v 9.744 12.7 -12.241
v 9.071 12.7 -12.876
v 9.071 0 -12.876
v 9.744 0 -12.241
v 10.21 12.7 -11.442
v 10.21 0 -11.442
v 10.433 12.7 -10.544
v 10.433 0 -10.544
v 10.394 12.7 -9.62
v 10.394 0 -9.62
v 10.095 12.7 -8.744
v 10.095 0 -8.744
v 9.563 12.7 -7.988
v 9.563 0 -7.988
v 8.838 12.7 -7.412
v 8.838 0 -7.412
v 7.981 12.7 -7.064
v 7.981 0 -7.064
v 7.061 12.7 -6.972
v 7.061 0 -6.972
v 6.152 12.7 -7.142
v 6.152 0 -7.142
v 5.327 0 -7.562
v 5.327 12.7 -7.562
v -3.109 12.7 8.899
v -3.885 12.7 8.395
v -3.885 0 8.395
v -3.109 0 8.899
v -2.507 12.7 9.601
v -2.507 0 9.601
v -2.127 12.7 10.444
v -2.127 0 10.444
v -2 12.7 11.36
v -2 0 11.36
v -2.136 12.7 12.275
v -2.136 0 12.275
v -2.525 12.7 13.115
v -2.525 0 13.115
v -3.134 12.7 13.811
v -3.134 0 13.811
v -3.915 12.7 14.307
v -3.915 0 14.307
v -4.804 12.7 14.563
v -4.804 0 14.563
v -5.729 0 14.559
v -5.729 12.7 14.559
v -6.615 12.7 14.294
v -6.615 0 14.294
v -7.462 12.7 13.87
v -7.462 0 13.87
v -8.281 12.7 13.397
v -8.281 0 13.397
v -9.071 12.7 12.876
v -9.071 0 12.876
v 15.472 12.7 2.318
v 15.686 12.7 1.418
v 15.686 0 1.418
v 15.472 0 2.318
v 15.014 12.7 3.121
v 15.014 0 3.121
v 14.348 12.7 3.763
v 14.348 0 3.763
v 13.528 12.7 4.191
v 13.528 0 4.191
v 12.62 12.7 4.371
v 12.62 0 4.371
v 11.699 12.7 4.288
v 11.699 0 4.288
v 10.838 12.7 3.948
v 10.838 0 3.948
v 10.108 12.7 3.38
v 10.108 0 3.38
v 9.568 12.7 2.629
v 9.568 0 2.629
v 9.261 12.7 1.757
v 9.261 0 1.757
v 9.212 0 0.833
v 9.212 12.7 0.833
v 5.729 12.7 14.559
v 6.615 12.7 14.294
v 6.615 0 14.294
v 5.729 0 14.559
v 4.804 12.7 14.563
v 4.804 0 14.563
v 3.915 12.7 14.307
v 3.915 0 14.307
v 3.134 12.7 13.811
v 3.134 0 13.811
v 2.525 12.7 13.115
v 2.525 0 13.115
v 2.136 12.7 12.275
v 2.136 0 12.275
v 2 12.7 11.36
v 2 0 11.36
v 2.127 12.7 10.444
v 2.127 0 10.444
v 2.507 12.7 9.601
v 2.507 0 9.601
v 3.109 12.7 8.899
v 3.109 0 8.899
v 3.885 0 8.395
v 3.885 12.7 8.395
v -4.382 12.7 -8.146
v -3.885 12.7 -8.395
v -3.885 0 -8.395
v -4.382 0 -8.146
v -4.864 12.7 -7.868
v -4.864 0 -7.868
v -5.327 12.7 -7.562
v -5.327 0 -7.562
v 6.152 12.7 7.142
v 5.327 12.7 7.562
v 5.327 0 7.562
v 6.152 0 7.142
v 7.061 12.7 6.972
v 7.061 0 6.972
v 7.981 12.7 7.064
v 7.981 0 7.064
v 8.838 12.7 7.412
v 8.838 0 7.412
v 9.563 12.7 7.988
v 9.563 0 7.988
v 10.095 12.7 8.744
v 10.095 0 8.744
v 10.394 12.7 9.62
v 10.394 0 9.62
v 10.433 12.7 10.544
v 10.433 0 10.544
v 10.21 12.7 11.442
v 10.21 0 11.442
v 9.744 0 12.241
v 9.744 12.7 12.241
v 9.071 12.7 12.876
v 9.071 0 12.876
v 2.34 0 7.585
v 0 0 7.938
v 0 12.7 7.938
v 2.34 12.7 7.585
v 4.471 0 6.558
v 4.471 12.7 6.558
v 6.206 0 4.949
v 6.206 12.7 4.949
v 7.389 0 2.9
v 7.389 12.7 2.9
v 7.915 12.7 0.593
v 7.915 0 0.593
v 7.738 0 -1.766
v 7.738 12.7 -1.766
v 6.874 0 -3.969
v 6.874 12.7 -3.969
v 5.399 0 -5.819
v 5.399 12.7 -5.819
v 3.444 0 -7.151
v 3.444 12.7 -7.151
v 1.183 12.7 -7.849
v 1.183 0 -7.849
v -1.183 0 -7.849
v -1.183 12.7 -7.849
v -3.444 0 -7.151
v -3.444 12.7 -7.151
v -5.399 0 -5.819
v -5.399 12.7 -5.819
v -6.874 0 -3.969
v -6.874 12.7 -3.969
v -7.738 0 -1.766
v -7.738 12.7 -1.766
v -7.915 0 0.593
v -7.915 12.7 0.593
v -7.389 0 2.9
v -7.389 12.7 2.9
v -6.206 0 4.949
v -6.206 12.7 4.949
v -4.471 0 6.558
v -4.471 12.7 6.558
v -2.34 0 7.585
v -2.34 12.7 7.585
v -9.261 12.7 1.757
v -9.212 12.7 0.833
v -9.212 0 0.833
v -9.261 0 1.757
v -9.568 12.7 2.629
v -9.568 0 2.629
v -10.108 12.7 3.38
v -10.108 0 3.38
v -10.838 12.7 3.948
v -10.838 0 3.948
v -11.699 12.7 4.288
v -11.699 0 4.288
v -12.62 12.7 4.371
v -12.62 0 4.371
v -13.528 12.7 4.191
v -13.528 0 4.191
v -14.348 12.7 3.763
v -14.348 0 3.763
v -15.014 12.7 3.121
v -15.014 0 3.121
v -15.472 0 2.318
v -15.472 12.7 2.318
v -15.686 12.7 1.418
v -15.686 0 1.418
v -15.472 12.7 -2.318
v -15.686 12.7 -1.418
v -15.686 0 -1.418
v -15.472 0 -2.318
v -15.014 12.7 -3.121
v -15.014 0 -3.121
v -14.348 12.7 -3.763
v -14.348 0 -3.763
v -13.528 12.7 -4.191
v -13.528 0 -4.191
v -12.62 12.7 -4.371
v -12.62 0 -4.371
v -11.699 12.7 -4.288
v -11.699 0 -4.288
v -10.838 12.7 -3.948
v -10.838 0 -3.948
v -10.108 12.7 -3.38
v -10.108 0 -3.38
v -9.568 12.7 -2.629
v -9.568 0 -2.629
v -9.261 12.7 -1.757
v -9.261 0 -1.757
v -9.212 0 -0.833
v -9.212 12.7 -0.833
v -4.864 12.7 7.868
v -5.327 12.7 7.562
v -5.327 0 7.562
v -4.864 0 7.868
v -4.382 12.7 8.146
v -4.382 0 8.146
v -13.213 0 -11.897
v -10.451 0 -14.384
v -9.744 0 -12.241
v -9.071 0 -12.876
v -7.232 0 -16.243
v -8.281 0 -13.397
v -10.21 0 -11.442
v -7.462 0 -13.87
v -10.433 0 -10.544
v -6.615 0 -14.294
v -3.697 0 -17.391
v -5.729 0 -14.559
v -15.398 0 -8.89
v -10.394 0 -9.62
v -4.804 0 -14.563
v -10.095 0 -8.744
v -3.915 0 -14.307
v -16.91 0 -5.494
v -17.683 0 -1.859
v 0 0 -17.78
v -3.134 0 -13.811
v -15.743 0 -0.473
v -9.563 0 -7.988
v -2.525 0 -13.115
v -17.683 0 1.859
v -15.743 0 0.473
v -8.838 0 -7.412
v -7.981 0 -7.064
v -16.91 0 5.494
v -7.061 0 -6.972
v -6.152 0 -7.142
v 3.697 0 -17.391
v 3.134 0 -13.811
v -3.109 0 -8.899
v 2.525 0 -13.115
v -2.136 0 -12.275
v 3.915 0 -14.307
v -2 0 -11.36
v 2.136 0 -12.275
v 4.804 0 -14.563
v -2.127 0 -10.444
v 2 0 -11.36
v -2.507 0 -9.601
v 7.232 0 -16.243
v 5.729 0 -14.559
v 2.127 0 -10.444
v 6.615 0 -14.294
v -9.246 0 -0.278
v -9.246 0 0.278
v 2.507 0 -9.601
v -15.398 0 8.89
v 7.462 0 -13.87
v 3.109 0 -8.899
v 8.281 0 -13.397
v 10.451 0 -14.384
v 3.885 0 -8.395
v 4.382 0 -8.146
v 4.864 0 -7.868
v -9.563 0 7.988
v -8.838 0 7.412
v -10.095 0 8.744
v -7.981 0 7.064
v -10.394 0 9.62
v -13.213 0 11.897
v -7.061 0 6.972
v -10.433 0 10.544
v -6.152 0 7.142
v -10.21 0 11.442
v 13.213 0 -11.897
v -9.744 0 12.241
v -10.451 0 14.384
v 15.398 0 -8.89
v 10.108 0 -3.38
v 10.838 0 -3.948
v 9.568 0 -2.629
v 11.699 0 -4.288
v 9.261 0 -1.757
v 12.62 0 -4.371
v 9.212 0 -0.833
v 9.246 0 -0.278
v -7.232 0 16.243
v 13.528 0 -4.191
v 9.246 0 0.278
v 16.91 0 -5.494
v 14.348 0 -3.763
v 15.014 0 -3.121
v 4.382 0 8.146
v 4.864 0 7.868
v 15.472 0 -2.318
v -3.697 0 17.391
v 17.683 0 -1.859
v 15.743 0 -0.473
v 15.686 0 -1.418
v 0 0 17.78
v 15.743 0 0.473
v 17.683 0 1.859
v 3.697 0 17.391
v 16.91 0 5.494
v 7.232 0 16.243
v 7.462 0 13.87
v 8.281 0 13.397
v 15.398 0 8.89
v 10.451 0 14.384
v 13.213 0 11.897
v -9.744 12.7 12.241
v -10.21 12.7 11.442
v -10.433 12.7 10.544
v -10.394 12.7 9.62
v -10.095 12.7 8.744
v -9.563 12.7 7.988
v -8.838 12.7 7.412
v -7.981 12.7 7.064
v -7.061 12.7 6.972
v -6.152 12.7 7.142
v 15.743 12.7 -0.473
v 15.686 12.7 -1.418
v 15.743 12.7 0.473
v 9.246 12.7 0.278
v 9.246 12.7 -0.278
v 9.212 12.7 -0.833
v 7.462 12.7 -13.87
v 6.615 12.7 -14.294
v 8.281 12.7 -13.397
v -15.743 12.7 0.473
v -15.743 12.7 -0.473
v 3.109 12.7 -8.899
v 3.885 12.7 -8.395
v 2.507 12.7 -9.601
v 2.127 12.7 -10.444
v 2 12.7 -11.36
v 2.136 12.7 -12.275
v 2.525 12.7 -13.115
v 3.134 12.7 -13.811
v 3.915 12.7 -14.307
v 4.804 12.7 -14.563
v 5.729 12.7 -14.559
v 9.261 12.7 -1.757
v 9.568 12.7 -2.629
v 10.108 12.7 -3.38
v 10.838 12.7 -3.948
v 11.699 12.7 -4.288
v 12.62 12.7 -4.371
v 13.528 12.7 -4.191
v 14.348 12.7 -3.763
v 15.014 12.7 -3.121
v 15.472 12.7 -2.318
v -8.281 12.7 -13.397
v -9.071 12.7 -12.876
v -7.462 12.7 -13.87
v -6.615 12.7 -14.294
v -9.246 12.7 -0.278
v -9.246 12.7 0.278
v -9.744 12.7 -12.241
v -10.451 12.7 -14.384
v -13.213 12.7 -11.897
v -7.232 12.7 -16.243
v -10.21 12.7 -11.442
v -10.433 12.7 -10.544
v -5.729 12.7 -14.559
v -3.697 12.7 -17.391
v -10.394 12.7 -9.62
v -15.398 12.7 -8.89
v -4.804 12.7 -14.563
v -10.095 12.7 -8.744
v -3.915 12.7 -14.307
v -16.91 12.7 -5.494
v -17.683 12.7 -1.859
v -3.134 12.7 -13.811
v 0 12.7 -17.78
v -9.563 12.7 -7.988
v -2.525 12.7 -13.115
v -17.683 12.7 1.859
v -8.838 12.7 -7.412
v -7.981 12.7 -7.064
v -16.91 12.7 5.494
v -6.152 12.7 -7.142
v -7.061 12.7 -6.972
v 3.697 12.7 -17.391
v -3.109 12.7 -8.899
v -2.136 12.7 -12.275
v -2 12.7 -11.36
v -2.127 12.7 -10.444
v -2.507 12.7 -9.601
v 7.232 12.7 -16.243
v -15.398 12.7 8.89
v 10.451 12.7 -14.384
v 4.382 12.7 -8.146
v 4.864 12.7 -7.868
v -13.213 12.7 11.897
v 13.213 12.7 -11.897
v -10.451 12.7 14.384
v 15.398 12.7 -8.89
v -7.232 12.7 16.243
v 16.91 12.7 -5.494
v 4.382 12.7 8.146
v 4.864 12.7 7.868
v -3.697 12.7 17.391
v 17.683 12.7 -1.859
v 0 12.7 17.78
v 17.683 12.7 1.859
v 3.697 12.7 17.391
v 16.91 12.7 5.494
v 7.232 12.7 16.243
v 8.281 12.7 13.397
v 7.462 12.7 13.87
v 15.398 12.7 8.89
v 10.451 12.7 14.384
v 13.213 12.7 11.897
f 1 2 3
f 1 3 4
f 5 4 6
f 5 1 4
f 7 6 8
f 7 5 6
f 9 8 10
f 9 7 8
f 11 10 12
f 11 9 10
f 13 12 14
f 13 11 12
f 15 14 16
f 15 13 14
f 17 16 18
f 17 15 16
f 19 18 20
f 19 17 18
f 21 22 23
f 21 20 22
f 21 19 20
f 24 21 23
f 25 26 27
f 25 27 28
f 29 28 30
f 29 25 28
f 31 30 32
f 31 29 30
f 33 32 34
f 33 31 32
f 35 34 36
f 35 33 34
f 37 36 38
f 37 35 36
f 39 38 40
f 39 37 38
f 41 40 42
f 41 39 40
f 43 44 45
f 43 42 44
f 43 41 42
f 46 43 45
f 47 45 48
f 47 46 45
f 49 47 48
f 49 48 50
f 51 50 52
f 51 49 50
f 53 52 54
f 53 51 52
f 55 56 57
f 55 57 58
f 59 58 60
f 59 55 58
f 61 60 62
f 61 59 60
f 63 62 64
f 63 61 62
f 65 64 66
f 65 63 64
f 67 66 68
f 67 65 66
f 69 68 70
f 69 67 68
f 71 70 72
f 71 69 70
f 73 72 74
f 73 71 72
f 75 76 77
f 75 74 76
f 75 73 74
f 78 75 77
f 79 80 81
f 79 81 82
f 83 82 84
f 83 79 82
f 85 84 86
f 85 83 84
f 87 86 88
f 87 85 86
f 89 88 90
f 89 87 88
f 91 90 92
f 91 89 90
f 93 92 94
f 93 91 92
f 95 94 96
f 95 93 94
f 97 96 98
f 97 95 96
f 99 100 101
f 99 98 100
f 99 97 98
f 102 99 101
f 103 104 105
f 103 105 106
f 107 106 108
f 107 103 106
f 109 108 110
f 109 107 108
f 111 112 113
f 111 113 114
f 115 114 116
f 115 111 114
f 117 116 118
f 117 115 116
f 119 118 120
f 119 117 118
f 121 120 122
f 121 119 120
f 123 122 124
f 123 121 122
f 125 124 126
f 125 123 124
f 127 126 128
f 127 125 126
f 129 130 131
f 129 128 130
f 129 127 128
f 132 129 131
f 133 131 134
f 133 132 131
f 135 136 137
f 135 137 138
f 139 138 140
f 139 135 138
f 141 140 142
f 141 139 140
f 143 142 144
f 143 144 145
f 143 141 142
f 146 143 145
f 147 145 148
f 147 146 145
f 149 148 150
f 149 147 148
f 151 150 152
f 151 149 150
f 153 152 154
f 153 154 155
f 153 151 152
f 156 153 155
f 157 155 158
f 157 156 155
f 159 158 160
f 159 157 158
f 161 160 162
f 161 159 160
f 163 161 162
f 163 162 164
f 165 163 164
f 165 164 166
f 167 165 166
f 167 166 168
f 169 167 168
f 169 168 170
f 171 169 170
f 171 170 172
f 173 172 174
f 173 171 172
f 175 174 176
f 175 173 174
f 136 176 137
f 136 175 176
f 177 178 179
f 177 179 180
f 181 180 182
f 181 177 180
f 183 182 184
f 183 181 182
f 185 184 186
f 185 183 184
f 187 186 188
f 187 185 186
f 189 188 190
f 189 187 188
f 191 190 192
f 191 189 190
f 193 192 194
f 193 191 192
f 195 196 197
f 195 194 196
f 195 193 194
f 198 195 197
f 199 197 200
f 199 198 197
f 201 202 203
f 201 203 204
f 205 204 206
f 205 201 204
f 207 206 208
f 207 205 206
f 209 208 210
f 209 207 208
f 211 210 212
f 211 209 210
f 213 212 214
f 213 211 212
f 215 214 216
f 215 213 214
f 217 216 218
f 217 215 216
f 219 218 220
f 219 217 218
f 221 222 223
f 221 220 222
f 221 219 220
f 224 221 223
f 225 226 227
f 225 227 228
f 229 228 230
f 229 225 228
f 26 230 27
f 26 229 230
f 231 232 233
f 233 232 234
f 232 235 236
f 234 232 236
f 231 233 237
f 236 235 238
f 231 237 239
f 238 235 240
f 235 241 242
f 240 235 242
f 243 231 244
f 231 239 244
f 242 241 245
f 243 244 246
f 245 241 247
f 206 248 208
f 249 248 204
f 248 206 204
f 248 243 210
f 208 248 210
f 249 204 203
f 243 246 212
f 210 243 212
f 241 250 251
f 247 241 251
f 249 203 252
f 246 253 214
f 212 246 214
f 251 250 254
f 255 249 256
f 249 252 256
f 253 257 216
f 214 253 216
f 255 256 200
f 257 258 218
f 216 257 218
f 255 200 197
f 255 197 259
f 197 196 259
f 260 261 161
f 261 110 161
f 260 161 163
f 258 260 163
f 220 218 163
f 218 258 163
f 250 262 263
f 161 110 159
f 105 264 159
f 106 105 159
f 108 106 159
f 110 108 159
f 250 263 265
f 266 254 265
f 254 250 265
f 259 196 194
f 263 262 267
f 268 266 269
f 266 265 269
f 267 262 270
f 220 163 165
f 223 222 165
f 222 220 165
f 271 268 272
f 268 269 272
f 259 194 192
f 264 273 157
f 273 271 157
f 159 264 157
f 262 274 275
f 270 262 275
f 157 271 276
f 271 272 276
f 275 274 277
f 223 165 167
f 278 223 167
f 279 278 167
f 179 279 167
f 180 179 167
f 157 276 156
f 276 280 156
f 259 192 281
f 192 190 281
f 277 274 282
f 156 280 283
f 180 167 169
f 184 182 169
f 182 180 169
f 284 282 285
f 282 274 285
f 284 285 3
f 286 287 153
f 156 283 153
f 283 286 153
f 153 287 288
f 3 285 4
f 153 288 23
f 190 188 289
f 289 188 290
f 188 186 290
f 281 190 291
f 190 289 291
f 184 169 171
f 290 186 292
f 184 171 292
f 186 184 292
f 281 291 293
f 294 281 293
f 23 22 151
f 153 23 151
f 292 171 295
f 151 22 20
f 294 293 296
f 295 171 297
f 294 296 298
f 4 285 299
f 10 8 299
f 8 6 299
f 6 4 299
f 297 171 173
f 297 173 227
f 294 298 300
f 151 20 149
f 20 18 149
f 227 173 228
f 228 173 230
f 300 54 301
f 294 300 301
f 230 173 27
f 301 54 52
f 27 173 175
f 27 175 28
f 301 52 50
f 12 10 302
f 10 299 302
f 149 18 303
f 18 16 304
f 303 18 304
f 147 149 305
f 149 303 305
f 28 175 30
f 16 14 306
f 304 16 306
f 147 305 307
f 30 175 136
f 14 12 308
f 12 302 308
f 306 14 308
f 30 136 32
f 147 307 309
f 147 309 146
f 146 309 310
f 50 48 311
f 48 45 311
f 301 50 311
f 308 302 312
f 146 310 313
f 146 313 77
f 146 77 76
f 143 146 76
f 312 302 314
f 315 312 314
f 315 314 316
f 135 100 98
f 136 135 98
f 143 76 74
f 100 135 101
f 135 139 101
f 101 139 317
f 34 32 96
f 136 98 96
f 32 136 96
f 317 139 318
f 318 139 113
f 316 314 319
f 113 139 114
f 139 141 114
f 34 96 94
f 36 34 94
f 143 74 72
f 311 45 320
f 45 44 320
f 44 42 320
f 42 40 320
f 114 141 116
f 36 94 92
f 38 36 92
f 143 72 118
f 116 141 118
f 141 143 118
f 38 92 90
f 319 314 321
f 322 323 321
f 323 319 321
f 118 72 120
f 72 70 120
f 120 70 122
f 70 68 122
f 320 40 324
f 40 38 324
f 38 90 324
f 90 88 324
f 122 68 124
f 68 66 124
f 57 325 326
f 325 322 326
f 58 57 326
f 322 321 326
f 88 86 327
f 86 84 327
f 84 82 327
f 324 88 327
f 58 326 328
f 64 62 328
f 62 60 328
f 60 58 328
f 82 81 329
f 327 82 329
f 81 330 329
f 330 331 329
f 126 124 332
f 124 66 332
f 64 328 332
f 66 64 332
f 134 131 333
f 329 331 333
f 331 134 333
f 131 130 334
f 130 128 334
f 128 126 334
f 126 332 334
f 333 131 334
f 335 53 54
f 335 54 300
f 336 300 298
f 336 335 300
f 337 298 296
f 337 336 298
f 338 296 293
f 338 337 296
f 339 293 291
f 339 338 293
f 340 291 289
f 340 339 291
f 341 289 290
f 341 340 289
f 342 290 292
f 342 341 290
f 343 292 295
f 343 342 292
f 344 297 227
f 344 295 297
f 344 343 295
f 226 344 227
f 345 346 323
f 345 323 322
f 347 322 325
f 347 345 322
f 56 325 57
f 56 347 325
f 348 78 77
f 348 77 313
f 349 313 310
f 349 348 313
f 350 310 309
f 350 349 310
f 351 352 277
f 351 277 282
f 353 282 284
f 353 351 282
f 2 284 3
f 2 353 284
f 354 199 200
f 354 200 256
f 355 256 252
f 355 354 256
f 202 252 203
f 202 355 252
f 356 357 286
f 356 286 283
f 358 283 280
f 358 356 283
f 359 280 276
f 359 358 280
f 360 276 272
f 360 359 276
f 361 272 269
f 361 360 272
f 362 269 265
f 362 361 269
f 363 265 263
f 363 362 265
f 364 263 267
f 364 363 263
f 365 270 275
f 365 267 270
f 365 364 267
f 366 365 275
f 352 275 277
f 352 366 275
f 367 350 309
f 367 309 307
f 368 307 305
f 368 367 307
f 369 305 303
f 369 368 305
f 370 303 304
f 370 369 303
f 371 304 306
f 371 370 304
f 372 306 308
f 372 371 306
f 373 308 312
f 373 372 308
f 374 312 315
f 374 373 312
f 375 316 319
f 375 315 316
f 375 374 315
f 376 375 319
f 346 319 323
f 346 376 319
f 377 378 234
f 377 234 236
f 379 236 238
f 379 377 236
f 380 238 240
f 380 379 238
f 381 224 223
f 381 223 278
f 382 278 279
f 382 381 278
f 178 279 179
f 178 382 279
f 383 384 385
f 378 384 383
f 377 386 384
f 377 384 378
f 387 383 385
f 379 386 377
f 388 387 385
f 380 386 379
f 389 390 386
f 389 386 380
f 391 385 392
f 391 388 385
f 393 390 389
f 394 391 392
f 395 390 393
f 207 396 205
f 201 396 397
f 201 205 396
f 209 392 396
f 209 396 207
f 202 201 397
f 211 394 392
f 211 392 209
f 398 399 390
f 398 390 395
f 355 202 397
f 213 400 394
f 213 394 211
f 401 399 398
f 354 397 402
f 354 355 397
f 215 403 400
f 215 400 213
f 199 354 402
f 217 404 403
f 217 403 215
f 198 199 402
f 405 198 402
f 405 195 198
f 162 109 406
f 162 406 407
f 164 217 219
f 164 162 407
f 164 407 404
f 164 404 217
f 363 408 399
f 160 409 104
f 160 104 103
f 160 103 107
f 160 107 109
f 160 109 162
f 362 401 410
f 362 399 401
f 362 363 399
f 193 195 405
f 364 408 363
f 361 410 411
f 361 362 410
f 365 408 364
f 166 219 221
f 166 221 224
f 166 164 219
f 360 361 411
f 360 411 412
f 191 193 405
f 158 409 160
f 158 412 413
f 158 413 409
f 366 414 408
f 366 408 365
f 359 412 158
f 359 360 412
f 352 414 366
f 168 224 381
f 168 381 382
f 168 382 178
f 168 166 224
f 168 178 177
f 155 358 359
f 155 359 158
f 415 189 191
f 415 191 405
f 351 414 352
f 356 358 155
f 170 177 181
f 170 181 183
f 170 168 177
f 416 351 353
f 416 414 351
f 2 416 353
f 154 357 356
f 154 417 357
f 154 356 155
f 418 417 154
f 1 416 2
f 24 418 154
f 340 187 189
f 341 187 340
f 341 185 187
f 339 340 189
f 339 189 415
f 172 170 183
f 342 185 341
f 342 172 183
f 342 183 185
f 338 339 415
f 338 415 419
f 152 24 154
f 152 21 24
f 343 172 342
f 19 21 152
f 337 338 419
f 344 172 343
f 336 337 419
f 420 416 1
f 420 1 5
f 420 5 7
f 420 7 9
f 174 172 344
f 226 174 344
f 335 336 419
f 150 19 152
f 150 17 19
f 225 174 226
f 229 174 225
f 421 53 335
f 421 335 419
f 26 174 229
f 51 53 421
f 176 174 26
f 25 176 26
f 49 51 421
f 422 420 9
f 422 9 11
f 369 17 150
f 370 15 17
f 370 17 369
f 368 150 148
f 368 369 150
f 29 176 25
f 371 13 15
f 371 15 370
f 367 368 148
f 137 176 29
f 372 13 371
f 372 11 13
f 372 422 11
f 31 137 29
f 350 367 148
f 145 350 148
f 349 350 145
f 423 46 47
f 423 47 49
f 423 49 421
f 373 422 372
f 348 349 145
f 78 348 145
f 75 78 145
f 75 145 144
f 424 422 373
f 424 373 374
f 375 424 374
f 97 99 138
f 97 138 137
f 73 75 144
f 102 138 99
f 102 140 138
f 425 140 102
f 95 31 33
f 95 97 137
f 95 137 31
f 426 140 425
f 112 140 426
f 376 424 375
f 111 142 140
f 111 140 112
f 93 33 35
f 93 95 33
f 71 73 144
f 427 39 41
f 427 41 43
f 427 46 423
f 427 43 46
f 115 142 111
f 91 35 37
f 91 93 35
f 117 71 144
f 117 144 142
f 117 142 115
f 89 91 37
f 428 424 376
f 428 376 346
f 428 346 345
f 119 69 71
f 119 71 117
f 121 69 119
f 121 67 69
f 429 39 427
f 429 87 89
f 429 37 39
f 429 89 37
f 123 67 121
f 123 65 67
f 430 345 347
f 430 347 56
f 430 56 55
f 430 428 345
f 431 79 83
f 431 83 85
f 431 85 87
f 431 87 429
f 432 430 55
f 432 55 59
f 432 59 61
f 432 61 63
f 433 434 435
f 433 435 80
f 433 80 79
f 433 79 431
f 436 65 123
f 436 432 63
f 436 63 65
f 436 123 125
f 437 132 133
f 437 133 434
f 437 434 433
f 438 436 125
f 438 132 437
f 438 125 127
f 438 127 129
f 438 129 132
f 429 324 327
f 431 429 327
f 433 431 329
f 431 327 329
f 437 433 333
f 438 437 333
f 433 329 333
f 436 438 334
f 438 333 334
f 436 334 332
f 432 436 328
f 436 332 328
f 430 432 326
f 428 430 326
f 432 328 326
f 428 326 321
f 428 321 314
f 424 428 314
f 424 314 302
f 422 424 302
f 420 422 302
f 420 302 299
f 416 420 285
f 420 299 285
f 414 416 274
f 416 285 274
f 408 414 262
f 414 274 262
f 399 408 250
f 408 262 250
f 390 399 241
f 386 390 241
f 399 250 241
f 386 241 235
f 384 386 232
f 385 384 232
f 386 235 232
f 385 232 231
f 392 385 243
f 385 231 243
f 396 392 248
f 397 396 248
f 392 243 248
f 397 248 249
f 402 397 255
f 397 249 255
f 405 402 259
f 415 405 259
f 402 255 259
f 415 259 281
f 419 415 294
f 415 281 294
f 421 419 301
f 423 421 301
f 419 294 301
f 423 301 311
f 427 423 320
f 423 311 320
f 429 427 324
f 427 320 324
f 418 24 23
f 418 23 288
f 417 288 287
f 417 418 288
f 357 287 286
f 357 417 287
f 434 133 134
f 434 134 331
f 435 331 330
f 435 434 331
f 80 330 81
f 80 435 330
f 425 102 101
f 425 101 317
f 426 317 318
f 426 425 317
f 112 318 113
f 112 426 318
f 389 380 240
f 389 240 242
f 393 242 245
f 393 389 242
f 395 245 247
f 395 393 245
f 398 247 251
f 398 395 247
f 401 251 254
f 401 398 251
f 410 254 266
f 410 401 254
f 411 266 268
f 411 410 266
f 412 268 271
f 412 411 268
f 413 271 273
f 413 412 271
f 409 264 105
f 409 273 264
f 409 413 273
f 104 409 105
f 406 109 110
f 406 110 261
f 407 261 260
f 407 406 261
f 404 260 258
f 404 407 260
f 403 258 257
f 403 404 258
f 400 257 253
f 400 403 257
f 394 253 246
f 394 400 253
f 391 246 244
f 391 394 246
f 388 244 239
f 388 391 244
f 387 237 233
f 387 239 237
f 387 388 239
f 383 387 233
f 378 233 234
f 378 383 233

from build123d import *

# Parameters (mm, degrees)
SKETCH1_R           = 17.78
SKETCH1_R_2         = 7.9375
BOSS_EXTRUDE1_DEPTH = 12.7
CUT_EXTRUDE1_DEPTH  = 29.169962726
CIRPATTERN1_COUNT   = 6


with BuildPart() as part:
    # Sketch1 → Boss-Extrude1 (new body)
    with BuildSketch(Plane(origin=(0, 0, 0), x_dir=(1, 0, 0), z_dir=(0, 1, 0))):
        with Locations(Location((0, 0, 0), (0, 0, 270))):
            Circle(SKETCH1_R)
        with Locations(Location((0, 0, 0), (0, 0, 270))):
            Circle(SKETCH1_R_2, mode=Mode.SUBTRACT)
    extrude(amount=BOSS_EXTRUDE1_DEPTH)

    # Sketch2 → Cut-Extrude1 (cut, through all)
    with BuildSketch(Plane(origin=(0, 12.7, 0), x_dir=(1, 0, 0), z_dir=(0, 1, 0))):
        with BuildLine():
            ThreePointArc((6.615, 14.293504644), (7.875, 13.63990011), (9.071038131, 12.875510368))
            ThreePointArc((9.071038131, 12.875510368), (9.856087957, 8.346857503), (5.327435093, 7.561807676))
            ThreePointArc((5.327435093, 7.561807676), (4.625, 8.010734985), (3.885, 8.394597965))
            ThreePointArc((3.885, 8.394597965), (2.300546661, 12.709051305), (6.615, 14.293504644))
        make_face()
    cut_extrude1 = extrude(amount=-CUT_EXTRUDE1_DEPTH, mode=Mode.SUBTRACT)

    # CirPattern1: Cut-Extrude1 ×6 about axis
    cirpattern1_axis = Axis((0, 0, 0), (0, 1, 0))
    for i in range(1, CIRPATTERN1_COUNT):
        add(cut_extrude1.rotate(cirpattern1_axis, i * 360 / CIRPATTERN1_COUNT), mode=Mode.SUBTRACT)


solid = part.part
